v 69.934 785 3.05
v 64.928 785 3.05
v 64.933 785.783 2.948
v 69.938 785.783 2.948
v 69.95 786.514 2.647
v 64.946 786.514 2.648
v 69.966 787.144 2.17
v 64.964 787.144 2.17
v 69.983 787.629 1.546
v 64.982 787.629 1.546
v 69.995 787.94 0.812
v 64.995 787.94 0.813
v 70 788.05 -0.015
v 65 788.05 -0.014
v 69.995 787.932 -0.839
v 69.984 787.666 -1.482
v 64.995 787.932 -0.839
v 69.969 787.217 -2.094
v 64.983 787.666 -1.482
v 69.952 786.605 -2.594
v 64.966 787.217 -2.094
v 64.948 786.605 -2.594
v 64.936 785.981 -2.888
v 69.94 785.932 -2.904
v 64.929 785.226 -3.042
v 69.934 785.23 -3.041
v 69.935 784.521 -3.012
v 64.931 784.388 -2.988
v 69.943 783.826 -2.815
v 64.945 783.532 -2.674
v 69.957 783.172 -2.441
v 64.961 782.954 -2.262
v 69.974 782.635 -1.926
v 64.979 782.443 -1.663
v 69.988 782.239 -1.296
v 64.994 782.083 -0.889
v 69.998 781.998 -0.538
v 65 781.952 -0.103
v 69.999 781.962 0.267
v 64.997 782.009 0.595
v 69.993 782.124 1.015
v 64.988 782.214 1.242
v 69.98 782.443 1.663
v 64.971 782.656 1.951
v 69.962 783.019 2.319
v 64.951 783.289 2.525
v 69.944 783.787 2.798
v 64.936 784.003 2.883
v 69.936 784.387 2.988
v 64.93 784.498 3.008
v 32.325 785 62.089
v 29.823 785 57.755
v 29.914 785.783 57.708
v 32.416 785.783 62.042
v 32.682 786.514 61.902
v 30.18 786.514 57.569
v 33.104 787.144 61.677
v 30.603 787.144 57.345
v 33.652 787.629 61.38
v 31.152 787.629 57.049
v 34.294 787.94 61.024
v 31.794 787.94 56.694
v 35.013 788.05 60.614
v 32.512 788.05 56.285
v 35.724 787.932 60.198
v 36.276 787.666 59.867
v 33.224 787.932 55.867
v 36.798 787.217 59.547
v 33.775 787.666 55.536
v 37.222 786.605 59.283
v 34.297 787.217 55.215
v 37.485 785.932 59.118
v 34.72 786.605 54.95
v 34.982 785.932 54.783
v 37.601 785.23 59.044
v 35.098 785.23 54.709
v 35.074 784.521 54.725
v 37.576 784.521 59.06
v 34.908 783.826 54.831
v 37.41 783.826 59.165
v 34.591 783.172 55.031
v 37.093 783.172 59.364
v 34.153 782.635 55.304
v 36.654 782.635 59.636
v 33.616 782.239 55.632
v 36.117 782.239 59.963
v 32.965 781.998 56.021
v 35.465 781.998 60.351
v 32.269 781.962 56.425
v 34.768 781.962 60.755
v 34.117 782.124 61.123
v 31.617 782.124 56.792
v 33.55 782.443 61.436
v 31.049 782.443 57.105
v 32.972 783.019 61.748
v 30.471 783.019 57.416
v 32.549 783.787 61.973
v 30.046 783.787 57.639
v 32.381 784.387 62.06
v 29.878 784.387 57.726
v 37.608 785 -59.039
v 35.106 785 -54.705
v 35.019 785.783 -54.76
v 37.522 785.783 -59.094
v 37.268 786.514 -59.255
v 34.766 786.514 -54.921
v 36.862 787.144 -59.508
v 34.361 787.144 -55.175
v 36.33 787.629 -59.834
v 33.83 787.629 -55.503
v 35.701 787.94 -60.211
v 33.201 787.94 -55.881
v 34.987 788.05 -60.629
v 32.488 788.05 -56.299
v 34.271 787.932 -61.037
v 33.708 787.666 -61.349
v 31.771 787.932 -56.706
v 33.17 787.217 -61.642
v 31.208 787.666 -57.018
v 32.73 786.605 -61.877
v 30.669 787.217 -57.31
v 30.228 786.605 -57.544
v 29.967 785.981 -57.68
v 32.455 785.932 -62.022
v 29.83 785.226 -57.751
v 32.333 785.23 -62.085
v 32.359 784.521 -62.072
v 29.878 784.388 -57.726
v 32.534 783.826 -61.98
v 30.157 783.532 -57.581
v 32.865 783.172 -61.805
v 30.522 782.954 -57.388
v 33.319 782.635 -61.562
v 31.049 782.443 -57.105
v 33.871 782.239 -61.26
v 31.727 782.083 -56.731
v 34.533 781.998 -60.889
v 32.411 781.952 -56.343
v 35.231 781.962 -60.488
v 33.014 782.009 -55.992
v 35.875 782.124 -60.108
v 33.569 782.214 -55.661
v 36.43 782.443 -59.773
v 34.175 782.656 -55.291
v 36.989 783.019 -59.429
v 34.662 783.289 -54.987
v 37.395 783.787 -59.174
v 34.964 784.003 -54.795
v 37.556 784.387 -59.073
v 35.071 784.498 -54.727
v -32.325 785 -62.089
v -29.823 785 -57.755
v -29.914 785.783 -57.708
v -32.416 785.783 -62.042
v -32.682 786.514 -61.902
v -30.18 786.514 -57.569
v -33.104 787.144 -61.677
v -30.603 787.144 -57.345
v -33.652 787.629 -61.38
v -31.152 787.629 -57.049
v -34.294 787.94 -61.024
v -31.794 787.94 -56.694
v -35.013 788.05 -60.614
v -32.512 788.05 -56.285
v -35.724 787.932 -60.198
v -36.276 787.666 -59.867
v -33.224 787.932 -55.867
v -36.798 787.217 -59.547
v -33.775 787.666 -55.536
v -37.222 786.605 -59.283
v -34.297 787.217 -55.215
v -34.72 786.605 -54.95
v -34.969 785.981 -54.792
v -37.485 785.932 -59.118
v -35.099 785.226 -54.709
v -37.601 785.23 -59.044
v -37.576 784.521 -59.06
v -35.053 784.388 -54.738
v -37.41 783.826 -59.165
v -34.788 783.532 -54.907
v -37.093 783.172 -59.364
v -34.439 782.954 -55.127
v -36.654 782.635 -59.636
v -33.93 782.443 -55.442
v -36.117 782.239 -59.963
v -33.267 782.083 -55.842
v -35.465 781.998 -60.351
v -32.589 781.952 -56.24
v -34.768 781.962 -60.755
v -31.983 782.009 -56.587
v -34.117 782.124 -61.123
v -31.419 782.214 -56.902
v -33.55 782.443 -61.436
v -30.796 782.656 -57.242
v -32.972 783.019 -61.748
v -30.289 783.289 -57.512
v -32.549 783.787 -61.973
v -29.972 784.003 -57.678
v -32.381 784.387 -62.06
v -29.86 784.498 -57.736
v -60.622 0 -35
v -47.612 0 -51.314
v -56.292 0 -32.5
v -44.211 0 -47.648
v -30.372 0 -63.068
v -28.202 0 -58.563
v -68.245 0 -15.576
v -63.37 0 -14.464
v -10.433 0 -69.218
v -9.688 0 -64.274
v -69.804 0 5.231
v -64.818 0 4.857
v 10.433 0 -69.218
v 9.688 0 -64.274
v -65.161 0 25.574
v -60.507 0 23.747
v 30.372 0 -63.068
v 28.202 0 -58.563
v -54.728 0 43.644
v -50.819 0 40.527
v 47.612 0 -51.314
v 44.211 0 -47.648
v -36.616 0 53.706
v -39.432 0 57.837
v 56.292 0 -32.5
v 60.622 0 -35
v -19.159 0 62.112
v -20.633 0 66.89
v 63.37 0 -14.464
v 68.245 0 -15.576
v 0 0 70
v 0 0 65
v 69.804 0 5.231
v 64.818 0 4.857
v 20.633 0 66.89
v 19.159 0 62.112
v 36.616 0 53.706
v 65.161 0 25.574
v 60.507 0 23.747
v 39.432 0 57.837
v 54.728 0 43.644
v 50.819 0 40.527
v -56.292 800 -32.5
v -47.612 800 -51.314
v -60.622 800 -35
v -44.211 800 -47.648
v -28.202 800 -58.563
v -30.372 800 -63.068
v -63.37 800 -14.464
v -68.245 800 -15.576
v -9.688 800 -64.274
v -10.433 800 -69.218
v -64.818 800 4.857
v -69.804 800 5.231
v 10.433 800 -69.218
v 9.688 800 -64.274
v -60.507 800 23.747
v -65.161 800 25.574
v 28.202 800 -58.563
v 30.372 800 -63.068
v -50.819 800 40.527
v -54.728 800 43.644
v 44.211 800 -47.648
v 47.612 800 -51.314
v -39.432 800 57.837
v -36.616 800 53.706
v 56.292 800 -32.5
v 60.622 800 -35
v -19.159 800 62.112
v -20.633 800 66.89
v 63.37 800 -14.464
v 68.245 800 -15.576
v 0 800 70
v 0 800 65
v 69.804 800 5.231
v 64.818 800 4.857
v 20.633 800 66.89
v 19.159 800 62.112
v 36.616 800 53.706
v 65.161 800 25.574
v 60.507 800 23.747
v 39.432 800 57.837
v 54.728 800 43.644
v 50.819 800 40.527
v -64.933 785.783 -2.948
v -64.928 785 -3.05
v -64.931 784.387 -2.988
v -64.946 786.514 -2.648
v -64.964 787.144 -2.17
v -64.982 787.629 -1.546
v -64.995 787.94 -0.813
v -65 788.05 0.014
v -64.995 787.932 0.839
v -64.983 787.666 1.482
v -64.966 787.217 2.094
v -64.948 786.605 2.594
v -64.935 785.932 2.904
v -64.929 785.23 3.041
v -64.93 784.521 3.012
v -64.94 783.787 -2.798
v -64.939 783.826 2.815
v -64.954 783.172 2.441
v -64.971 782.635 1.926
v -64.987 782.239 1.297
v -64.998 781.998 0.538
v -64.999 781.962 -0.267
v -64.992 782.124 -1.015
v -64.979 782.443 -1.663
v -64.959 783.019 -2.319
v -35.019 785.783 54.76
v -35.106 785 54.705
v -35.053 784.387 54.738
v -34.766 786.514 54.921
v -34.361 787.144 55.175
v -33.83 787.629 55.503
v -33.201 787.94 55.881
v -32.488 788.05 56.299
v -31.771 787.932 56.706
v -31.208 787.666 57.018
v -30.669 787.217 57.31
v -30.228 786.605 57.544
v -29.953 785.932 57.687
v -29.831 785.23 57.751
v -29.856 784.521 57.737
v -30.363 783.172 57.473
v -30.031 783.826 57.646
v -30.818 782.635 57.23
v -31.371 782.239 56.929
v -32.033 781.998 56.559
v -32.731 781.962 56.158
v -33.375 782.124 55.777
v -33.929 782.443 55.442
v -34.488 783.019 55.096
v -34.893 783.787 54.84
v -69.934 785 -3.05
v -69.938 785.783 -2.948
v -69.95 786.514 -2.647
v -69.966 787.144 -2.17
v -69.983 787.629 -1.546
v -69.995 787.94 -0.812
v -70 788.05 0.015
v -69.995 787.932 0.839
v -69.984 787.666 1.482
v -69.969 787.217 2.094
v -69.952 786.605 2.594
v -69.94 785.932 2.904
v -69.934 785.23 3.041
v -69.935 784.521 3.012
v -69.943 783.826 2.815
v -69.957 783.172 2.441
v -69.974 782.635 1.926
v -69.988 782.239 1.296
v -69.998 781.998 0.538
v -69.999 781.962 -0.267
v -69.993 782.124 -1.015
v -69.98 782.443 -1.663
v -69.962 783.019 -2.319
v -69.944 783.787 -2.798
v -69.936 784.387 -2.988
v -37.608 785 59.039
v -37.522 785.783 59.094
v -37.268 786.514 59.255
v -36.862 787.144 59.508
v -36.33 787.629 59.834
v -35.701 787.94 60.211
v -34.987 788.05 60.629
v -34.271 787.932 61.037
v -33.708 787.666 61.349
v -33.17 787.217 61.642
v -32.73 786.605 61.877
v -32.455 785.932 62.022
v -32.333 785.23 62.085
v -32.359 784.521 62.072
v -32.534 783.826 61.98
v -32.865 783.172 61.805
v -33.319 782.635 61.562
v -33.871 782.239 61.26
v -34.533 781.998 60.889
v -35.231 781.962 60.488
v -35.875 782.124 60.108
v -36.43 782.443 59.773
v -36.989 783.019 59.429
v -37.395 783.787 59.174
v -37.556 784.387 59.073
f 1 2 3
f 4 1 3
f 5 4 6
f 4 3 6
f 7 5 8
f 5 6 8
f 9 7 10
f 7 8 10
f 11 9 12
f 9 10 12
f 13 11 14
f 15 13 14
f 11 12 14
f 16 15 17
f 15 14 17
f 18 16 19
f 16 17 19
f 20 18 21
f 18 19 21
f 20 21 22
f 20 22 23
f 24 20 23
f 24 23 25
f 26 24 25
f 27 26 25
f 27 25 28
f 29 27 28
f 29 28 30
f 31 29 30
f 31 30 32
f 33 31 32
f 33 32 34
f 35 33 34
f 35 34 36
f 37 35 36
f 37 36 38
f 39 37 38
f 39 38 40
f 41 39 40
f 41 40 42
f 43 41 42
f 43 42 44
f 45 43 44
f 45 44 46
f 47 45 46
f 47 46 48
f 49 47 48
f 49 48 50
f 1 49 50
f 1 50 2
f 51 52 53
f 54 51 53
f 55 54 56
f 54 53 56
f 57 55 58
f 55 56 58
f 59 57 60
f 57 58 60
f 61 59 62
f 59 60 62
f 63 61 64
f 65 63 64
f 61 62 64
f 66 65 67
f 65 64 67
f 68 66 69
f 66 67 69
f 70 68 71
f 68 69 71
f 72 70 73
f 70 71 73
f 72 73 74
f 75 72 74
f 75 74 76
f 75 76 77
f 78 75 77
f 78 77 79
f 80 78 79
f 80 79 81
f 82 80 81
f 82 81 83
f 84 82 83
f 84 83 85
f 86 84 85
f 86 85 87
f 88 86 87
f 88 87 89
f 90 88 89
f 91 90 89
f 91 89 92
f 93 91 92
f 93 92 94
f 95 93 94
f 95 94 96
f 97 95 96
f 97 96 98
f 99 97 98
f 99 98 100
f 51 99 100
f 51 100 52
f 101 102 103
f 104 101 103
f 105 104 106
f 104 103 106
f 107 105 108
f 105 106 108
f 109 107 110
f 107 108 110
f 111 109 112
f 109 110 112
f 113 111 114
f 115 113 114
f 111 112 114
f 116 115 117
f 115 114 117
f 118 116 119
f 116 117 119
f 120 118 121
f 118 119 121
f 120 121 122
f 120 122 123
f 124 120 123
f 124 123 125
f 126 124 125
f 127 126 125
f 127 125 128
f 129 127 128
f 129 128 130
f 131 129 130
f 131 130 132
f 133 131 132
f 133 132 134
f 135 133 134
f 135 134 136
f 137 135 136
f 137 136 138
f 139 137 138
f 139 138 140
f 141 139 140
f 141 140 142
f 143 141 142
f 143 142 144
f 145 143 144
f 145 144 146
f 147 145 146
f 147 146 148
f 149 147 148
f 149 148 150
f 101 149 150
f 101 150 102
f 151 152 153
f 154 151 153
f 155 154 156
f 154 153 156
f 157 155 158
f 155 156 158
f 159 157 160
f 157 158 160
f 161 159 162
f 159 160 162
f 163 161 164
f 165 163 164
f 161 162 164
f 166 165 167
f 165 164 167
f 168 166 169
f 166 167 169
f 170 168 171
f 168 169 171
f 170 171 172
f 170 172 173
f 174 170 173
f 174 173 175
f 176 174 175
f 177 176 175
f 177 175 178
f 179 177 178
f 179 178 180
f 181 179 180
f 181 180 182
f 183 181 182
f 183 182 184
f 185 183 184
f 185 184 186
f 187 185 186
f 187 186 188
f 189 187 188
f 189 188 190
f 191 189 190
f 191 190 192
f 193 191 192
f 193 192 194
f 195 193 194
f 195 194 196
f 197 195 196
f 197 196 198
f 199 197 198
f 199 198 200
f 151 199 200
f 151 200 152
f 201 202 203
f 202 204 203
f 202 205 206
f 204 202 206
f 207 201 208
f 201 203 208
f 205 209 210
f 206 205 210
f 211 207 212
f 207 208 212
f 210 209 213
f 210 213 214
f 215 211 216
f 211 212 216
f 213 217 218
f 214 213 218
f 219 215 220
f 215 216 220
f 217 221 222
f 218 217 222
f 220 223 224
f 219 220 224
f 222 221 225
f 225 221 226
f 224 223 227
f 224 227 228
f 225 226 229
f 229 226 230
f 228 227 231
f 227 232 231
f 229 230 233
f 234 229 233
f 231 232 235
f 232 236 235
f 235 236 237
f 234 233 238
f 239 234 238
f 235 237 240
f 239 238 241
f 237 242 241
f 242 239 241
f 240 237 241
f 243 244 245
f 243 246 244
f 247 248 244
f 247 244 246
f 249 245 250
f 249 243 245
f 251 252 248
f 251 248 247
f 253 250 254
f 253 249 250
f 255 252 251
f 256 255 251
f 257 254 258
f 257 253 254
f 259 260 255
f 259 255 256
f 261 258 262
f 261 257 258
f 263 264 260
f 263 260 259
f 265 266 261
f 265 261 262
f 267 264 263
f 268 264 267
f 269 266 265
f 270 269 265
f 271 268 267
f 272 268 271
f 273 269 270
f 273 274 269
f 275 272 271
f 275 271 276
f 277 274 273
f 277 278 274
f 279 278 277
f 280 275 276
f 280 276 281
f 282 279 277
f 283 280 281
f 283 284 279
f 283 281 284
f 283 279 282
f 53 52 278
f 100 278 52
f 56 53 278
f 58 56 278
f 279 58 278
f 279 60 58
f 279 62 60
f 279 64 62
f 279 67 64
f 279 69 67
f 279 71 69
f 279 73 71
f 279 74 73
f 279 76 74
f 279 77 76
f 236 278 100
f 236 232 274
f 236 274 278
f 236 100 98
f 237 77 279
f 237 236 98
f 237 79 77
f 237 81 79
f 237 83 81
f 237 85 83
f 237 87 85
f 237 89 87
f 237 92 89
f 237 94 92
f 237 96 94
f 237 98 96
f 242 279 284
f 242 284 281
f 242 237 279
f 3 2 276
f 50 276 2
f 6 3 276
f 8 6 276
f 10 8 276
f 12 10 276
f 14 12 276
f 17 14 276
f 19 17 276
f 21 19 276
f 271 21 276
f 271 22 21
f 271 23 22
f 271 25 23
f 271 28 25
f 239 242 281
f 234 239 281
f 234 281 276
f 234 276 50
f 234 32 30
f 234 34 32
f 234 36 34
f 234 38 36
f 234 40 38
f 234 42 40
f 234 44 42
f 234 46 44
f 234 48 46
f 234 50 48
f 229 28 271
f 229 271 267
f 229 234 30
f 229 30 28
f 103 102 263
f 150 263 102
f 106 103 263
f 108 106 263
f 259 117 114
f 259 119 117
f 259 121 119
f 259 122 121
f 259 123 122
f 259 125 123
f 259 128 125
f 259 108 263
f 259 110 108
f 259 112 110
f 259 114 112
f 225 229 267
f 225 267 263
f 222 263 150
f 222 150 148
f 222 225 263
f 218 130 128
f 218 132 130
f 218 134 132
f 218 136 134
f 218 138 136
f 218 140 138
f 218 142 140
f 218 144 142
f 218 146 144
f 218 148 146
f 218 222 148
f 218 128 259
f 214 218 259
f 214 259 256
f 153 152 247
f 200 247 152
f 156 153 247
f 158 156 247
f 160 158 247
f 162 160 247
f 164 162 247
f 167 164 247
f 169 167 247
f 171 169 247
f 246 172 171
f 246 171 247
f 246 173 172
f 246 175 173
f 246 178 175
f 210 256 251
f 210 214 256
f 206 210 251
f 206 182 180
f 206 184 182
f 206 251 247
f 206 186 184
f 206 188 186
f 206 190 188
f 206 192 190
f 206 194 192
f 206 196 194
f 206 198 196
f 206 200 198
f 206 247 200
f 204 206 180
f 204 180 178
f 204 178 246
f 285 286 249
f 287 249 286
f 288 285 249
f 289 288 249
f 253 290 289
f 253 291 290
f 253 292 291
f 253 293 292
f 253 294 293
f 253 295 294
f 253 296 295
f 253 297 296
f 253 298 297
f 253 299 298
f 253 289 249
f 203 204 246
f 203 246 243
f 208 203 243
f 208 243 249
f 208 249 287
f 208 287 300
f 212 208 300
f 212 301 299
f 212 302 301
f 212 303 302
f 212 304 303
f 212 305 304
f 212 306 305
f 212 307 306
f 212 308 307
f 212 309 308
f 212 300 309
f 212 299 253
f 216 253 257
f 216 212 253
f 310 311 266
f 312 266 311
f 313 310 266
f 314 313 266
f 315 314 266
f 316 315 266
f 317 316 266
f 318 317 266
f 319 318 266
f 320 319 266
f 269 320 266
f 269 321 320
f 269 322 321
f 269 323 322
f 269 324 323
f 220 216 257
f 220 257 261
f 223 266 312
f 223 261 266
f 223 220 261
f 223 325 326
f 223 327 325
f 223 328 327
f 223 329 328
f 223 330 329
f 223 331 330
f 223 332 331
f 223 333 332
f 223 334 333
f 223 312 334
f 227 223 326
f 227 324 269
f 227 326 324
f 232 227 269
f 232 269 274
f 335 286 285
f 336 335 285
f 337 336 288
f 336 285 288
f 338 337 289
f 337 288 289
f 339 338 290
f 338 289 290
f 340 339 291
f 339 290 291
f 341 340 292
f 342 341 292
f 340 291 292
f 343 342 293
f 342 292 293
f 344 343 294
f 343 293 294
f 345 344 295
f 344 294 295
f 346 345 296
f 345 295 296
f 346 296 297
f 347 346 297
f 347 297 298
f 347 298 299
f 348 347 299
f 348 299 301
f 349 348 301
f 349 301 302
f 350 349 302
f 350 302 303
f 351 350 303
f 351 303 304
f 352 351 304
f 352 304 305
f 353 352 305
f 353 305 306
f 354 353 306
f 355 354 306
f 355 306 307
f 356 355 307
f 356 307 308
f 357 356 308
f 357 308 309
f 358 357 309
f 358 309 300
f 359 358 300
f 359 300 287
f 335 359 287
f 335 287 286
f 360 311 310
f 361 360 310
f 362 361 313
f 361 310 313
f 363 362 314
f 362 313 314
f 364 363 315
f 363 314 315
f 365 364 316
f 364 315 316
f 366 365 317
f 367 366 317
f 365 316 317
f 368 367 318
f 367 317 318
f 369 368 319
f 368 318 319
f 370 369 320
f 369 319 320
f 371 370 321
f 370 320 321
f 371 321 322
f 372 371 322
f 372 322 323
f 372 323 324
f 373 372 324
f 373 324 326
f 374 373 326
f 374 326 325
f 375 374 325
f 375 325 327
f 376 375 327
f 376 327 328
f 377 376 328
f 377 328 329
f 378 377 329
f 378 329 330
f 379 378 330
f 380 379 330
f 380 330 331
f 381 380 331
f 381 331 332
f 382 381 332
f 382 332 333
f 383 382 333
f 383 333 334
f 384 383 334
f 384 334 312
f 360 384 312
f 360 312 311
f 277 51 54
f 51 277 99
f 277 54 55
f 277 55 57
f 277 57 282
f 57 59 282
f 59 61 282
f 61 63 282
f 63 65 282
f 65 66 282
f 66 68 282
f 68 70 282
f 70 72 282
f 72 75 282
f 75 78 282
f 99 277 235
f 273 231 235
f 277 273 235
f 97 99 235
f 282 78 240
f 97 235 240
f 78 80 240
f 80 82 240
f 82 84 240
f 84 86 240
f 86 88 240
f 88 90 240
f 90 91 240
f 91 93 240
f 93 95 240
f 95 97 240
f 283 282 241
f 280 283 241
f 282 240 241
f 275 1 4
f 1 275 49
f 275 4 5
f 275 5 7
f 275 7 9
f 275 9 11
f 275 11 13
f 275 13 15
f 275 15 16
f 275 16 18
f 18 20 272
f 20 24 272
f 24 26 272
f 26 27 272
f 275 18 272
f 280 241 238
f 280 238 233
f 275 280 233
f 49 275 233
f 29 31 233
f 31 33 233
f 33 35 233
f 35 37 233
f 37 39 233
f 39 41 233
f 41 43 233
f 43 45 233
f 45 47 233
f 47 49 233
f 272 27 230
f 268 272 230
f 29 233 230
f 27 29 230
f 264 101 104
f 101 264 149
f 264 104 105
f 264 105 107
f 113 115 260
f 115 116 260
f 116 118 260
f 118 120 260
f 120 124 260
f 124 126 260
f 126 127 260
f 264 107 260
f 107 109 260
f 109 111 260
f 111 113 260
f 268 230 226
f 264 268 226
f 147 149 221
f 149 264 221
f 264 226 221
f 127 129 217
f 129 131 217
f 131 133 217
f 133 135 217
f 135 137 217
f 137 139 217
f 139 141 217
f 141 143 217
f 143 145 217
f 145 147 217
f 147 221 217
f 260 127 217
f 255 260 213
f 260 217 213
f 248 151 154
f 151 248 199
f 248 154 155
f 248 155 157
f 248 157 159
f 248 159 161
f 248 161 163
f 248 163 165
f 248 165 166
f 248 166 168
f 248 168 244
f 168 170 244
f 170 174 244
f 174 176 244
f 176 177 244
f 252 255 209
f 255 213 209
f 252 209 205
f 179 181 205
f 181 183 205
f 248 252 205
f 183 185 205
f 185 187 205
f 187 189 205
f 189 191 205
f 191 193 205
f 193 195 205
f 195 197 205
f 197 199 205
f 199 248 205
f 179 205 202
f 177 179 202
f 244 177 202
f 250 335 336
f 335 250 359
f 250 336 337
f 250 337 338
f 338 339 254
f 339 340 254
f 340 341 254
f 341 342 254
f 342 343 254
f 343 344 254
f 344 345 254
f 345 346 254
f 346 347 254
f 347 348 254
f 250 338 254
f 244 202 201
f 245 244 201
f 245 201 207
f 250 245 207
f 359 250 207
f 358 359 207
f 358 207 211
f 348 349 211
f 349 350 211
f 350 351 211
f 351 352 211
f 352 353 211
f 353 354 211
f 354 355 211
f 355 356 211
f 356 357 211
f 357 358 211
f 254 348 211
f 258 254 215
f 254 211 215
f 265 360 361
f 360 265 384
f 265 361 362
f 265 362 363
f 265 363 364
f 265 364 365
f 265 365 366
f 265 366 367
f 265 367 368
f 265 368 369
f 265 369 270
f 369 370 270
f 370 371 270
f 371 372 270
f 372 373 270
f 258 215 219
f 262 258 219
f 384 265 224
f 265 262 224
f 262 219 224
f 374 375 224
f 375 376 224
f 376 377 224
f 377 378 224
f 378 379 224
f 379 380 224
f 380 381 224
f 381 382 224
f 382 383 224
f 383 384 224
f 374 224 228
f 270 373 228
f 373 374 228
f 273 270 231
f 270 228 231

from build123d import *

# Parameters (mm, degrees)
SKETCH1_R               = 70
SKETCH1_R_2             = 65
BOSS_EXTRUDE1_DEPTH     = 800
CUT_EXTRUDE1_REACH      = 808.102
CUT_EXTRUDE1_END_RADIUS = 70
SKETCH2_R               = 3.05
CIRPATTERN1_COUNT       = 6


with BuildPart() as part:
    # Sketch1 → Boss-Extrude1 (new body)
    with BuildSketch(Plane(origin=(0, 0, 0), x_dir=(1, 0, 0), z_dir=(0, 1, 0))):
        with Locations(Location((0, 0, 0), (0, 0, 270))):
            Circle(SKETCH1_R)
        with Locations(Location((0, 0, 0), (0, 0, 270))):
            Circle(SKETCH1_R_2, mode=Mode.SUBTRACT)
    extrude(amount=BOSS_EXTRUDE1_DEPTH)

    # Cut-Extrude1: up to this cylinder (the profile starts inside it)
    cut_extrude1_end = Plane(origin=(0, 785, 0), z_dir=(0, -1, 0)) * Cylinder(CUT_EXTRUDE1_END_RADIUS, 1757.204, mode=Mode.PRIVATE)
    # Sketch2 → Cut-Extrude1 (cut, up to the surface)
    with BuildSketch(Plane(origin=(0, 0, 0), x_dir=(0, 0, -1), z_dir=(1, 0, 0)), mode=Mode.PRIVATE) as cut_extrude1_sk1:
        with Locations((0, 785)):
            Circle(SKETCH2_R)
    cut_extrude1_tool1 = extrude(cut_extrude1_sk1.sketch, amount=-CUT_EXTRUDE1_REACH, mode=Mode.PRIVATE) & cut_extrude1_end
    cut_extrude1 = cut_extrude1_tool1.solids().sort_by_distance((0, 785, 0))[0]
    add(cut_extrude1, mode=Mode.SUBTRACT)

    # CirPattern1: Cut-Extrude1 ×6 about axis
    cirpattern1_axis = Axis((0, 800, 0), (0, 1, 0))
    for i in range(1, CIRPATTERN1_COUNT):
        add(cut_extrude1.rotate(cirpattern1_axis, i * 360 / CIRPATTERN1_COUNT), mode=Mode.SUBTRACT)


solid = part.part
